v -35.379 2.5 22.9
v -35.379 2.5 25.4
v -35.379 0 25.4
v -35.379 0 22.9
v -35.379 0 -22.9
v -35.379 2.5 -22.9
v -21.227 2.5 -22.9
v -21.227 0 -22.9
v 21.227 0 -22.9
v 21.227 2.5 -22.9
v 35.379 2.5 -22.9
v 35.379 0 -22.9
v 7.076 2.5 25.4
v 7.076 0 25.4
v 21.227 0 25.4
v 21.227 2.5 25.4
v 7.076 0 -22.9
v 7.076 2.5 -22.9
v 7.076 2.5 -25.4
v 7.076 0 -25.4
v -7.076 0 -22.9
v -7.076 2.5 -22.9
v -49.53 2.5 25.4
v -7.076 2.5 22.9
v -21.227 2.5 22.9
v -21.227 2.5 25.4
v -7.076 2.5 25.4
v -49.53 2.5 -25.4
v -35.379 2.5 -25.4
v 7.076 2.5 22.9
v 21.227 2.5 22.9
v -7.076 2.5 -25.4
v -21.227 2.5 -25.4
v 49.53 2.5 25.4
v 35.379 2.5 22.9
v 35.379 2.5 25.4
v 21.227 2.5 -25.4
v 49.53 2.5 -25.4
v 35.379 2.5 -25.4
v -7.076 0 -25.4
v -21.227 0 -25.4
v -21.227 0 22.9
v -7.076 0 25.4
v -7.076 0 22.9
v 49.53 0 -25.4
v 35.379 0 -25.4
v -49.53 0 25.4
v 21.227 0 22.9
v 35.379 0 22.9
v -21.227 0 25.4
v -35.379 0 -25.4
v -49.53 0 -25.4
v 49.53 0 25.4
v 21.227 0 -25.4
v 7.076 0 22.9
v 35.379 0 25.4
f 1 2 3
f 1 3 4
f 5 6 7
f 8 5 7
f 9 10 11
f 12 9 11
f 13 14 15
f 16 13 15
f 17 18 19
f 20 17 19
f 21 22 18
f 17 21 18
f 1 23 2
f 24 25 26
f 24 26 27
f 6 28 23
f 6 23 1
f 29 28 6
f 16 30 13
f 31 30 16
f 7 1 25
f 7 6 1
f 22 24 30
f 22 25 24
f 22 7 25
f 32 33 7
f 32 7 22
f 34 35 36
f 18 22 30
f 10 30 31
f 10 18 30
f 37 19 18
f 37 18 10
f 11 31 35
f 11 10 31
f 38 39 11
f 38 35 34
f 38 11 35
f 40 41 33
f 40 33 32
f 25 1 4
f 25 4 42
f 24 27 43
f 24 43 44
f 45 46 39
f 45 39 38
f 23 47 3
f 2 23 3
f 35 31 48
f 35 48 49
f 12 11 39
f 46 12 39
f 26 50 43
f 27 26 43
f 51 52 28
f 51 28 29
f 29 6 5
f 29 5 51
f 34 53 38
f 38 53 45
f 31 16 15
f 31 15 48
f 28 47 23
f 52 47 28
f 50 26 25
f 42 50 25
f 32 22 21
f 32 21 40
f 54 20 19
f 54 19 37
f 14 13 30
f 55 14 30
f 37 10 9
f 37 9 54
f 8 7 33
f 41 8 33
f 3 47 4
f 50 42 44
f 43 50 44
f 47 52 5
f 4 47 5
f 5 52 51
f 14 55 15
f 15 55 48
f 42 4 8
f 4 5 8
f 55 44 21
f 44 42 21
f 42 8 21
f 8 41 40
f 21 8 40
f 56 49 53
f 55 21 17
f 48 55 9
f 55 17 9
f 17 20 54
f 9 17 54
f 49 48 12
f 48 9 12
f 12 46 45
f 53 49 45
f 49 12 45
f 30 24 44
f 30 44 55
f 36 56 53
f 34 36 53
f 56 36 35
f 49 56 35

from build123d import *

# Parameters (mm, degrees)
SKETCH1_W           = 99.06
SKETCH1_H           = 50.8
BOSS_EXTRUDE1_DEPTH = 2.5
SKETCH2_W           = 14.151428572
SKETCH2_H           = 2.5
CUT_EXTRUDE1_DEPTH  = 2.54


with BuildPart() as part:
    # Sketch1 → Boss-Extrude1 (new body)
    with BuildSketch(Plane(origin=(0, 0, 0), x_dir=(1, 0, 0), z_dir=(0, 1, 0))):
        Rectangle(SKETCH1_W, SKETCH1_H)
    extrude(amount=BOSS_EXTRUDE1_DEPTH)

    # Sketch2 → Cut-Extrude1 (cut)
    with BuildSketch(Plane(origin=(0, 2.5, 0), x_dir=(1, 0, 0), z_dir=(0, 1, 0))):
        with Locations((-28.302857143, 24.15)):
            Rectangle(SKETCH2_W, SKETCH2_H)
        with Locations((0, 24.15)):
            Rectangle(SKETCH2_W, SKETCH2_H)
        with Locations((28.302857143, 24.15)):
            Rectangle(SKETCH2_W, SKETCH2_H)
        with Locations((-28.302857143, -24.15)):
            Rectangle(SKETCH2_W, SKETCH2_H)
        with Locations((0, -24.15)):
            Rectangle(SKETCH2_W, SKETCH2_H)
        with Locations((28.302857143, -24.15)):
            Rectangle(SKETCH2_W, SKETCH2_H)
    extrude(amount=-CUT_EXTRUDE1_DEPTH, mode=Mode.SUBTRACT)


solid = part.part
